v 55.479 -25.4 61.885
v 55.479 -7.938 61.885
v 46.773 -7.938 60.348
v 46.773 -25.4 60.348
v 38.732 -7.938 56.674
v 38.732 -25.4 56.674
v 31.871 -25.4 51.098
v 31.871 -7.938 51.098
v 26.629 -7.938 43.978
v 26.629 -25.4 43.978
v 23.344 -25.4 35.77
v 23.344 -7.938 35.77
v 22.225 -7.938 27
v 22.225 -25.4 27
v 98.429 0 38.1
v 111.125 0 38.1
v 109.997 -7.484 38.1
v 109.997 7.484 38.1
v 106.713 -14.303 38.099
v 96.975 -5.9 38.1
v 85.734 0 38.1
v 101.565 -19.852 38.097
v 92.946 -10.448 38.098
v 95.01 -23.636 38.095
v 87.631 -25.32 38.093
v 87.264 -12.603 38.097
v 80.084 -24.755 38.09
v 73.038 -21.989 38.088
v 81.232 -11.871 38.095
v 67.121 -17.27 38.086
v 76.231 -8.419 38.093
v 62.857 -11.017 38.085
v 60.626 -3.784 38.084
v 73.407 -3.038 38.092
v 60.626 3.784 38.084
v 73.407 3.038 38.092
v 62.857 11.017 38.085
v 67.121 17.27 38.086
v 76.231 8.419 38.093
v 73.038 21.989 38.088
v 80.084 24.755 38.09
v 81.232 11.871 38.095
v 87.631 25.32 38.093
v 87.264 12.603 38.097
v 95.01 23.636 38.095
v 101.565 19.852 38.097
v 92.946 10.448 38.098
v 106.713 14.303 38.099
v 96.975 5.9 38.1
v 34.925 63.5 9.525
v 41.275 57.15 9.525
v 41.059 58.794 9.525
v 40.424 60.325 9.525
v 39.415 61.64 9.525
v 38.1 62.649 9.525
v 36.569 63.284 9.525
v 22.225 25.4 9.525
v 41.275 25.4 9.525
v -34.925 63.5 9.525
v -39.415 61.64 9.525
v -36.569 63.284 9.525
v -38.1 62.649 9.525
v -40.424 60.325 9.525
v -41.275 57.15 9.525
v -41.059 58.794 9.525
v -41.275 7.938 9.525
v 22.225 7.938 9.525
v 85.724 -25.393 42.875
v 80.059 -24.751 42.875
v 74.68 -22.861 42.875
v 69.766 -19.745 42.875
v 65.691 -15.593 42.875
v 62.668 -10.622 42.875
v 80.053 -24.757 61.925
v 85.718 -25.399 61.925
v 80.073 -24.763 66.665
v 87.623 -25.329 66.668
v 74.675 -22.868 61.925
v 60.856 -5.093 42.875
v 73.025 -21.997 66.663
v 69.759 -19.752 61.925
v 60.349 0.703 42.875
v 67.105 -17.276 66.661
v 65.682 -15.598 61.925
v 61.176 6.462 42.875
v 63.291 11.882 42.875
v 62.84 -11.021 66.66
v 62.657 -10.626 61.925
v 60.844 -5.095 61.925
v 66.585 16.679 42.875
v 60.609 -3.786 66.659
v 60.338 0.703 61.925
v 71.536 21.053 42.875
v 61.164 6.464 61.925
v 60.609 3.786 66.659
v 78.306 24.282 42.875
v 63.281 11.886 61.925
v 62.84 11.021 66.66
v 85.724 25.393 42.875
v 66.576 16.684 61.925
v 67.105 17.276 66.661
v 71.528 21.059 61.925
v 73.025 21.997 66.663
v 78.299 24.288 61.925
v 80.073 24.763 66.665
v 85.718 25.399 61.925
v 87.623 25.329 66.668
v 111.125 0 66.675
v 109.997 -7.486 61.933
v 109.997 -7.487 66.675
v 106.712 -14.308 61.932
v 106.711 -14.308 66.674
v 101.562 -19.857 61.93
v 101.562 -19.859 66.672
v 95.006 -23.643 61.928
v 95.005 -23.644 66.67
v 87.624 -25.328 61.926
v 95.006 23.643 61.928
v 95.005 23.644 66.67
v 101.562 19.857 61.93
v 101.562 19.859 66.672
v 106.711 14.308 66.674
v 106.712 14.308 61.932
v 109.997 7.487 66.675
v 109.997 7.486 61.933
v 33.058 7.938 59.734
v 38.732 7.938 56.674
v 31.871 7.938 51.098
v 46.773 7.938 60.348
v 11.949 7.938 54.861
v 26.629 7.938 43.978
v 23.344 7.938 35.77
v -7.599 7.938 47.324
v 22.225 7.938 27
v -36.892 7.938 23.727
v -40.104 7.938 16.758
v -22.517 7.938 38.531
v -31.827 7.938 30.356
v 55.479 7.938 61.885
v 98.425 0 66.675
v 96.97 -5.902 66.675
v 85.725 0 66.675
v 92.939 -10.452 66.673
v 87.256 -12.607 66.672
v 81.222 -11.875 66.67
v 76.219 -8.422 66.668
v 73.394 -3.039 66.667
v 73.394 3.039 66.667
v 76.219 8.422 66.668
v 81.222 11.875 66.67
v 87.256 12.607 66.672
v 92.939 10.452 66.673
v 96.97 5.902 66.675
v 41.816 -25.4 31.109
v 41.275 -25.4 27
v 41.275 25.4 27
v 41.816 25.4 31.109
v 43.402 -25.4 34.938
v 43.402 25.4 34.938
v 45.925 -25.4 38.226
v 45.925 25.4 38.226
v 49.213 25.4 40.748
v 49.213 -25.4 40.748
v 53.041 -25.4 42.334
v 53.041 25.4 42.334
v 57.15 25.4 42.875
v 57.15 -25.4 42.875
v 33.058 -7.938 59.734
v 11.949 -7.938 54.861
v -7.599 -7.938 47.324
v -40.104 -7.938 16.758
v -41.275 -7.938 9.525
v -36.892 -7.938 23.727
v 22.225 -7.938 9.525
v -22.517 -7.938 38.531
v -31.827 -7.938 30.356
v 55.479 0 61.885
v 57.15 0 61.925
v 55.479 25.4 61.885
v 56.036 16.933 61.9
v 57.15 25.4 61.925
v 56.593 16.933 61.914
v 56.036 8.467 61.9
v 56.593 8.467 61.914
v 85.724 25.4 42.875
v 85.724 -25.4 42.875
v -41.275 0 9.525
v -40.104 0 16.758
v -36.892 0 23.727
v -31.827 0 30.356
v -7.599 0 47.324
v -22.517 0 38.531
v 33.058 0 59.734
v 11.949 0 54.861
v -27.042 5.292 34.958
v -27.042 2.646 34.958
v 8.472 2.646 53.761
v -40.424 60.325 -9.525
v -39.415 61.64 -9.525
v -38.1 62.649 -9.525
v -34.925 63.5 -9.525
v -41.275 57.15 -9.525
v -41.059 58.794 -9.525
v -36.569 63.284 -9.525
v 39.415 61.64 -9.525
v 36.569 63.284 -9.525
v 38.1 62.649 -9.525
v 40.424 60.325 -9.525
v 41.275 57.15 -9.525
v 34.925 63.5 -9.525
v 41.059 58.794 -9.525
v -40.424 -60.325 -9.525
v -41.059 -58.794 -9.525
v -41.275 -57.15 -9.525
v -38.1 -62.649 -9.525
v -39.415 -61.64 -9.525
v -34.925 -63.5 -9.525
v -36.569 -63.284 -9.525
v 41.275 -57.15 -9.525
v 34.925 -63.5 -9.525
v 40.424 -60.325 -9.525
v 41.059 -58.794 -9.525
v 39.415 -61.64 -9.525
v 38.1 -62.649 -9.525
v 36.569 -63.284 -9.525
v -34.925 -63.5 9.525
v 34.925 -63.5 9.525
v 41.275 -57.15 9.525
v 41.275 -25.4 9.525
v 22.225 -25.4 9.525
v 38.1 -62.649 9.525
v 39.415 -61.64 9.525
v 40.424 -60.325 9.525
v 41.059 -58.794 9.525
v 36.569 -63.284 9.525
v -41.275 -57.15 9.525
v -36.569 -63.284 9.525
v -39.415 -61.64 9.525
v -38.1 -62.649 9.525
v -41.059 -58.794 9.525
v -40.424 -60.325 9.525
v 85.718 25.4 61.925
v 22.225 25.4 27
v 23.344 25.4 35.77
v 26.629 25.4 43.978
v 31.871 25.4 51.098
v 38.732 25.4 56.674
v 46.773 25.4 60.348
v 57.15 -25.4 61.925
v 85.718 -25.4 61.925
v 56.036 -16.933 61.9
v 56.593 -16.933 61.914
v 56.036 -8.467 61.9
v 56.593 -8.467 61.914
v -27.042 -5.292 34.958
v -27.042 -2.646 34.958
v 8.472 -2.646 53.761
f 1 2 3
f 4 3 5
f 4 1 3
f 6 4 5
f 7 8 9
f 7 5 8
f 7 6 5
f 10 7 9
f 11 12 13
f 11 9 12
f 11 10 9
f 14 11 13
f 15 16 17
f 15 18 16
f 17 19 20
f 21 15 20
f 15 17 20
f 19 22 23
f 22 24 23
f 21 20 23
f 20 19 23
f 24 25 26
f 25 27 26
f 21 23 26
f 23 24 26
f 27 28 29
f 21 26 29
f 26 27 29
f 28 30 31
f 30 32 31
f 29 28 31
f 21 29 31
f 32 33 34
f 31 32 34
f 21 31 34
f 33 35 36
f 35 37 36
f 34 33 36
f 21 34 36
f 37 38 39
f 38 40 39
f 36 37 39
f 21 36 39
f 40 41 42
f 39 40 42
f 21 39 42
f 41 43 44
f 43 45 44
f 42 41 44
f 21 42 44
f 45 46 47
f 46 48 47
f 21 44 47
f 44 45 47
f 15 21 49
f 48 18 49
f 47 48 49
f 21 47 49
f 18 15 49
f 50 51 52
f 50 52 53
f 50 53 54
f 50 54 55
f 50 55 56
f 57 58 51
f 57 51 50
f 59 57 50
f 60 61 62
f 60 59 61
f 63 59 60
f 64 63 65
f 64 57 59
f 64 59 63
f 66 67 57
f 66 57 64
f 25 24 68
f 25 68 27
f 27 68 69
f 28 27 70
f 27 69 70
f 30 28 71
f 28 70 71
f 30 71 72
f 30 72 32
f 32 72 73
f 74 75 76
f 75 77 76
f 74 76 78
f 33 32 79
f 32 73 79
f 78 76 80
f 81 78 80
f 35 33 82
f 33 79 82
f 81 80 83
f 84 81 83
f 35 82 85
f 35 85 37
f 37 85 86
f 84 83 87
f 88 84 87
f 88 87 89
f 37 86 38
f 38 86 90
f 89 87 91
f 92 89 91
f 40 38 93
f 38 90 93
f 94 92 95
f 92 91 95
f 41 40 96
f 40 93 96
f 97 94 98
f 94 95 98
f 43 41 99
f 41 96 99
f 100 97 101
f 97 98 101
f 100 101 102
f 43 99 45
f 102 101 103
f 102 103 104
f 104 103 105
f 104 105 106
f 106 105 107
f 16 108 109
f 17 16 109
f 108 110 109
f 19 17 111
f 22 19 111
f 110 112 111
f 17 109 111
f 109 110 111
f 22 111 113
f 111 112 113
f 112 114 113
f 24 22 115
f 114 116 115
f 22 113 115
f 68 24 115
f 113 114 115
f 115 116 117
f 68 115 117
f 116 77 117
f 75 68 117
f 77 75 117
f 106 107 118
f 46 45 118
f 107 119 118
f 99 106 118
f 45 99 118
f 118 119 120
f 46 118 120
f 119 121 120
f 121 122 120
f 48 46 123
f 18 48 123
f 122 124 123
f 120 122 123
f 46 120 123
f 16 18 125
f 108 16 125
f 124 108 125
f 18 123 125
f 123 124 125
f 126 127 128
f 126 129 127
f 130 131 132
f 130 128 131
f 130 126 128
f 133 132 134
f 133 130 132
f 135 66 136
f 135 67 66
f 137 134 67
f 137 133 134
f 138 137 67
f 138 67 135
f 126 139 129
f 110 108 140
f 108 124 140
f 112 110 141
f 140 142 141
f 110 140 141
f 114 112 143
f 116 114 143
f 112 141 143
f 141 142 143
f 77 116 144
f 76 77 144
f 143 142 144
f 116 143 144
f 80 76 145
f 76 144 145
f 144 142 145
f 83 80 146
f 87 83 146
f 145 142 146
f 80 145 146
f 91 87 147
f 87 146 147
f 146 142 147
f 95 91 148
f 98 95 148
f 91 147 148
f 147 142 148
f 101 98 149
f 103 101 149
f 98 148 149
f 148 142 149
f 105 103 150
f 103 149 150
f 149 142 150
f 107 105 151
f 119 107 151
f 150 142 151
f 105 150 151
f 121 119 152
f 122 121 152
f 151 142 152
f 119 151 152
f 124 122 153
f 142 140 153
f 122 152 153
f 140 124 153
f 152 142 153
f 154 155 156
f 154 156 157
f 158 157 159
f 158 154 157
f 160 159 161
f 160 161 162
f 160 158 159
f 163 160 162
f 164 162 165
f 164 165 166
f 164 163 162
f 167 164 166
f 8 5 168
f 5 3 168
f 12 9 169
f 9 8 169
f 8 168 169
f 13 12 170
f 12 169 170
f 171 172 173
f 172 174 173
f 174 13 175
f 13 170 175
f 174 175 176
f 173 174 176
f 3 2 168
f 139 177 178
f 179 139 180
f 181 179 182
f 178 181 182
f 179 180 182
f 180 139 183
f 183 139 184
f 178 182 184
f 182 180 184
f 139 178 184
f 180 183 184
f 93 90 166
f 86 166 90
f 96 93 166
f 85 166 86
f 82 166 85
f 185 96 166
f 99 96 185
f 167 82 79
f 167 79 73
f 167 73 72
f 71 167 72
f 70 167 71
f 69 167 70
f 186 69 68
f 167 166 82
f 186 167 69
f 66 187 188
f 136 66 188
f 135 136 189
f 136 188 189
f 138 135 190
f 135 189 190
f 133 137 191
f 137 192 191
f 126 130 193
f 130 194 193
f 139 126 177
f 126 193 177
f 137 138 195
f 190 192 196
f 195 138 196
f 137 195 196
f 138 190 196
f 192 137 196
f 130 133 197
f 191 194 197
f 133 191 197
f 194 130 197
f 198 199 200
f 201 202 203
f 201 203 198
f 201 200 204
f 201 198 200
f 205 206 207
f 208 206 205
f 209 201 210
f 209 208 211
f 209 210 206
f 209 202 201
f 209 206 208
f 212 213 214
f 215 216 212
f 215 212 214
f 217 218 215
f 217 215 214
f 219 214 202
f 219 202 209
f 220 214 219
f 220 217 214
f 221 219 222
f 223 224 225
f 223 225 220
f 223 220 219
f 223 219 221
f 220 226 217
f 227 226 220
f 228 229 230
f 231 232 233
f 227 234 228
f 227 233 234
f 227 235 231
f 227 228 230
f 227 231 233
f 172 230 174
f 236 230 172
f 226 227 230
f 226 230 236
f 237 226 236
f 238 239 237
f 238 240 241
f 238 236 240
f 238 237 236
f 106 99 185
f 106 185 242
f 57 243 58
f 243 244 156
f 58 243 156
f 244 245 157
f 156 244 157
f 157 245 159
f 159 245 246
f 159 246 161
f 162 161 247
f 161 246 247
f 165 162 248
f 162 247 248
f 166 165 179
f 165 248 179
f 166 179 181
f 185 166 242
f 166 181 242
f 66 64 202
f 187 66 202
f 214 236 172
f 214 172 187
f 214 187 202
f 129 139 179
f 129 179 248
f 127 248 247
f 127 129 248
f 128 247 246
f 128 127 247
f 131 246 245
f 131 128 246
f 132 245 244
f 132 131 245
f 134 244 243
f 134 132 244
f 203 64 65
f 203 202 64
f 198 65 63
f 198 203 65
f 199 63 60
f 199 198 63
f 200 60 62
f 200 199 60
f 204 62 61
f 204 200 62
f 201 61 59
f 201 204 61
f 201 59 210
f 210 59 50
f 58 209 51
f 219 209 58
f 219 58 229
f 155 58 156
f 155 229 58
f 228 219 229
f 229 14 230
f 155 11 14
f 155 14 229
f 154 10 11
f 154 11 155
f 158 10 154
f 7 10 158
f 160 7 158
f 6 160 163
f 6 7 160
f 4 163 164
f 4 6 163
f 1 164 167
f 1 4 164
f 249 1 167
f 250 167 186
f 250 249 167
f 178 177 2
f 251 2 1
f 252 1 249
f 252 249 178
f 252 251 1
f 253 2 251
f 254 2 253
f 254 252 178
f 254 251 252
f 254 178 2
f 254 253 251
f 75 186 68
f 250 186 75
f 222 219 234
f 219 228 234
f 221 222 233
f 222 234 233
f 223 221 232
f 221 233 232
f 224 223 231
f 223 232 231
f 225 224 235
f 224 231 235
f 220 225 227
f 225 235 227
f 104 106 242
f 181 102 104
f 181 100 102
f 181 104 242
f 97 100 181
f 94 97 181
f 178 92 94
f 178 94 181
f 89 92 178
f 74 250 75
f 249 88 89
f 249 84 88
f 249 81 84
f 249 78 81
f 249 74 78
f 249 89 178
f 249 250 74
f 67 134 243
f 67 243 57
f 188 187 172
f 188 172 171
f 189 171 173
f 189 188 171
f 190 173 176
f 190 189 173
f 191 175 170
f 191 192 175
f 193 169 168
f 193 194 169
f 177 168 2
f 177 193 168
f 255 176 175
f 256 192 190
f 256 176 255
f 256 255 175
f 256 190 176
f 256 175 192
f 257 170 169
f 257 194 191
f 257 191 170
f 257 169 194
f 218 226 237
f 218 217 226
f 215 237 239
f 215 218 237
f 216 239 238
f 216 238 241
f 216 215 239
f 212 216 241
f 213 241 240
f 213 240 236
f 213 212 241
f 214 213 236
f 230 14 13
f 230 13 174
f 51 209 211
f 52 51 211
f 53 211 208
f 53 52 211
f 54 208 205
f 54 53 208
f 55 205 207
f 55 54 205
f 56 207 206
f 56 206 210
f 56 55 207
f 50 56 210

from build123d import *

# Parameters (mm, degrees)
F1_DEPTH = 63.5
F2_DEPTH = 25.4
F3_DEPTH = 7.9375
F5_R     = 6.35


with BuildPart() as f1:
    # F0 (on Front) → F1 (new body, symmetric)
    with BuildSketch(Plane.XZ):
        Polygon((22.225, 9.525), (-41.275, 9.525), (-41.275, -9.525), (41.275, -9.525), (41.275, 9.525), align=None)
    extrude(amount=F1_DEPTH, both=True)

    # F0 (on Front) → F2 (join, symmetric)
    with BuildSketch(Plane.XZ):
        with BuildLine():
            Line((22.225, 27.0002), (22.225, 9.525))
            Line((22.225, 9.525), (41.275, 9.525))
            Line((41.275, 9.525), (41.275, 27.0002))
            ThreePointArc((41.275, 27.0002), (45.9246798487, 38.2255201513), (57.15, 42.8752))
            Line((57.15, 42.8752), (60.325, 42.8752))
            Line((60.325, 42.8752), (60.325, 61.9252))
            Line((60.325, 61.9252), (57.15, 61.9252))
            add(Edge.make_bspline(
                [(55.4794704974, 61.8852248127), (56.036011294, 61.9013524911), (56.5928753418, 61.9146861922), (57.15, 61.9252)],
                knots=[110.2645678644, 110.2645678644, 110.2645678644, 110.2645678644, 111.5045361635, 111.5045361635, 111.5045361635, 111.5045361635], degree=3))
            ThreePointArc((55.4794704974, 61.8852248127), (31.8705729112, 51.0980461913), (22.225, 27.0002))
        make_face()
        Polygon((85.7179611921, 61.9252), (60.325, 61.9252), (60.325, 42.8752), (85.723823737, 42.8752), align=None)
    extrude(amount=F2_DEPTH, both=True)

    # F0 (on Front) → F3 (join, symmetric)
    with BuildSketch(Plane.XZ):
        with BuildLine():
            add(Edge.make_bspline(
                [(-41.275, 9.525), (-40.945480422, 36.9229423767), (5.9889065218, 60.4510659796), (55.4794704974, 61.8852248127)],
                knots=[0, 0, 0, 0, 110.2645678644, 110.2645678644, 110.2645678644, 110.2645678644], degree=3))
            Line((-41.275, 9.525), (22.225, 9.525))
            Line((22.225, 9.525), (22.225, 27.0002))
            ThreePointArc((22.225, 27.0002), (31.8705729112, 51.0980461913), (55.4794704974, 61.8852248127))
        make_face()
    extrude(amount=F3_DEPTH, both=True)

    # F0 (on Front) → F4 (revolve)
    with BuildSketch(Plane.XZ):
        Polygon((111.125, 66.675), (85.725, 66.675), (85.7337938173, 38.1), (111.125, 38.1), align=None)
    revolve(axis=Axis((85.7293969086, 0, 52.3875), (0.0003077451, 0, -0.9999999526)))

    # F5
    f5_edges = [f1.edges().sort_by_distance(p)[0] for p in [
        (-41.275, -63.5, 0),
        (41.275, -63.5, 0),
        (41.275, 63.5, 0),
        (-41.275, 63.5, 0),
    ]]
    fillet(f5_edges, radius=F5_R)


solid = f1.part
